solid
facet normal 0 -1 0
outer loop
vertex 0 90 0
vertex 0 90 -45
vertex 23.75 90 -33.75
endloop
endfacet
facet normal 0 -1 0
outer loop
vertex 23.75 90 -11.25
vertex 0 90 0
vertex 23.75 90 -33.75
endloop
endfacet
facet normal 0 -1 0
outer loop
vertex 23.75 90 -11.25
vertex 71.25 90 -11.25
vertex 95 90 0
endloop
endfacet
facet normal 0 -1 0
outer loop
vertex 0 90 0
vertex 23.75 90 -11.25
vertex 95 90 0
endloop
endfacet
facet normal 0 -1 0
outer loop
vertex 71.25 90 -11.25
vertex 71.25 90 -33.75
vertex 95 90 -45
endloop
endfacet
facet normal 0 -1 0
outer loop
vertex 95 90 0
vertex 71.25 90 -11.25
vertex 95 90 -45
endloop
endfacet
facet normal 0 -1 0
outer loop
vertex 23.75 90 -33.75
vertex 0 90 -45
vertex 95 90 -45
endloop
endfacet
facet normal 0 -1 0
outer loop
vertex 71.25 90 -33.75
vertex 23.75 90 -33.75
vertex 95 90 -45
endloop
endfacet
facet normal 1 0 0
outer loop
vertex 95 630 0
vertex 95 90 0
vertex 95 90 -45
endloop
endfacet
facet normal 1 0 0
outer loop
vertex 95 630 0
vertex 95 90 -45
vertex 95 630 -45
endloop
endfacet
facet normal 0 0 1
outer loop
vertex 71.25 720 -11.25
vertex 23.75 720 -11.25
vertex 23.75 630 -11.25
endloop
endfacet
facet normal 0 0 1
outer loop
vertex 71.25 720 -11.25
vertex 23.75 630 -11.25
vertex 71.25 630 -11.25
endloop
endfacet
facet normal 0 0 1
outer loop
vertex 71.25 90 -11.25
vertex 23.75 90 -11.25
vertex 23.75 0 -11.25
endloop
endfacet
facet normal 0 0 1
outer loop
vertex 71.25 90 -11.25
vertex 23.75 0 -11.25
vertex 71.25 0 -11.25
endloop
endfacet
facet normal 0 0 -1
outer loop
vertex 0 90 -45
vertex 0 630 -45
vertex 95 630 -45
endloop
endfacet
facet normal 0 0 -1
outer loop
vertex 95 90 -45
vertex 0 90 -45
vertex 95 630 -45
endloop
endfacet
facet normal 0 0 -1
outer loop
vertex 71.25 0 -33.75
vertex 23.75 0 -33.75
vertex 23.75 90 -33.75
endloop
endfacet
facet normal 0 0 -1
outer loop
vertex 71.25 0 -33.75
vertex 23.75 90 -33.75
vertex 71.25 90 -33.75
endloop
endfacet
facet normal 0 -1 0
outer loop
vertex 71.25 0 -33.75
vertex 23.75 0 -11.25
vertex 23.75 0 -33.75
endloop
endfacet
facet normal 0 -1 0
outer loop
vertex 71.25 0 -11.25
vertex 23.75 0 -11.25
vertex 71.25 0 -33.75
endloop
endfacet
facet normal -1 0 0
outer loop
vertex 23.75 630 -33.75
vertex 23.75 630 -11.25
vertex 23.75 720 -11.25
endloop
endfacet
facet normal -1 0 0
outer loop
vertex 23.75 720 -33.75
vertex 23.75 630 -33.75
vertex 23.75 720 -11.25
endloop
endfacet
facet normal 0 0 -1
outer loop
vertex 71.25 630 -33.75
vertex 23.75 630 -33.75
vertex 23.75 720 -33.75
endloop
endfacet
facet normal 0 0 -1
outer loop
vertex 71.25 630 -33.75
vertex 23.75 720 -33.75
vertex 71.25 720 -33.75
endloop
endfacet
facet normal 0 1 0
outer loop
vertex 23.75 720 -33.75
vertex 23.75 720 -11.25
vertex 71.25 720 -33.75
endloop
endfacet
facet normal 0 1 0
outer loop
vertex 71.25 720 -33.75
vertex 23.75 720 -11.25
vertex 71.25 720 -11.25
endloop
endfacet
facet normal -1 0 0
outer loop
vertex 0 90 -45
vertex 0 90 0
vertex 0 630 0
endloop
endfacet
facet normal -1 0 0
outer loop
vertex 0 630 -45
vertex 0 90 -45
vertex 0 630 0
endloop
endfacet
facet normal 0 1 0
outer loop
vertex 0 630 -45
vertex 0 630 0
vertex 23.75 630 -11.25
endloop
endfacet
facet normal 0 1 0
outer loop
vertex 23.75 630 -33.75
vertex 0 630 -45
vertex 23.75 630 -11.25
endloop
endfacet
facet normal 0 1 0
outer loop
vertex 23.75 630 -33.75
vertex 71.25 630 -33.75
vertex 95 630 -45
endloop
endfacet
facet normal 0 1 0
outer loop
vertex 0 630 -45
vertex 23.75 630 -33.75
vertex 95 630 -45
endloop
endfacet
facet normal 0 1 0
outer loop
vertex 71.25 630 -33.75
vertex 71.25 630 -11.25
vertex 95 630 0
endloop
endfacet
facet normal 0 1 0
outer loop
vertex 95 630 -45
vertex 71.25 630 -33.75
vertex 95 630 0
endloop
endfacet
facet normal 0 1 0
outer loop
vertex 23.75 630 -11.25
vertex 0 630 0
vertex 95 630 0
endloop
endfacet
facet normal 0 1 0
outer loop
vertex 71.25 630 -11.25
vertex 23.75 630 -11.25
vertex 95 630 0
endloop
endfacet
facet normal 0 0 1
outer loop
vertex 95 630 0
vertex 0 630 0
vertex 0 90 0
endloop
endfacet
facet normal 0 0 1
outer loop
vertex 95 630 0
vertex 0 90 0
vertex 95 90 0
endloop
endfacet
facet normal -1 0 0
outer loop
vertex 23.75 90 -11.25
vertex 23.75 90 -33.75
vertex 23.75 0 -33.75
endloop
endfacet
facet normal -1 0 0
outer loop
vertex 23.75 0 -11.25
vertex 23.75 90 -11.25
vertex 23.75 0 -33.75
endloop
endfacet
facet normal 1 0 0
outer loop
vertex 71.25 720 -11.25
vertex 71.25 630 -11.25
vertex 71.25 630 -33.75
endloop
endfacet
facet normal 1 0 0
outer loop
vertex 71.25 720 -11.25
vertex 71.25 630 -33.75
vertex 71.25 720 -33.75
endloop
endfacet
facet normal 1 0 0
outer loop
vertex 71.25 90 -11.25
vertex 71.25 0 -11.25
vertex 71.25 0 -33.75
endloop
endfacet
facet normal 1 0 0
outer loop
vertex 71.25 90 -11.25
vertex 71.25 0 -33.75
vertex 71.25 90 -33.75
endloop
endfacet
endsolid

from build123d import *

# Parameters (mm, degrees)
SKETCH004_W     = 95
SKETCH004_H     = 720
PAD002_DEPTH    = 45
SKETCH014_W     = 95
SKETCH014_H     = 90
POCKET008_DEPTH = 11.25
SKETCH015_W     = 95
SKETCH015_H     = 90
POCKET009_DEPTH = 11.25
SKETCH016_W     = 23.75
SKETCH016_H     = 90
POCKET010_DEPTH = 11.25
SKETCH017_W     = 23.75
SKETCH017_H     = 90
POCKET011_DEPTH = 11.25
SKETCH018_W     = 23.75
SKETCH018_H     = 90
POCKET012_DEPTH = 11.25
SKETCH019_W     = 23.75
SKETCH019_H     = 90
POCKET013_DEPTH = 11.25


with BuildPart() as part:
    # Sketch004 → Pad002 (new body)
    with BuildSketch(Plane.XY):
        with Locations((47.5, 360)):
            Rectangle(SKETCH004_W, SKETCH004_H)
    extrude(amount=-PAD002_DEPTH)

    # Sketch014 (on Face5 of Pad002) → Pocket008 (cut)
    with BuildSketch(Plane.XY):
        with Locations((47.5, 45)):
            Rectangle(SKETCH014_W, SKETCH014_H)
        with Locations((47.5, 675)):
            Rectangle(SKETCH014_W, SKETCH014_H)
    extrude(amount=-POCKET008_DEPTH, mode=Mode.SUBTRACT)

    # Sketch015 (on Face4 of Pocket008) → Pocket009 (cut)
    with BuildSketch(Plane(origin=(0, 0, -45), x_dir=(1, 0, 0), z_dir=(0, 0, -1))):
        with Locations((47.5, -45)):
            Rectangle(SKETCH015_W, SKETCH015_H)
        with Locations((47.5, -675)):
            Rectangle(SKETCH015_W, SKETCH015_H)
    extrude(amount=-POCKET009_DEPTH, mode=Mode.SUBTRACT)

    # Sketch016 (on Face9 of Pocket009) → Pocket010 (cut)
    with BuildSketch(Plane.XY.offset(-11.25)):
        with Locations((11.875, 45)):
            Rectangle(SKETCH016_W, SKETCH016_H)
        with Locations((83.125, 45)):
            Rectangle(SKETCH016_W, SKETCH016_H)
    extrude(amount=-POCKET010_DEPTH, mode=Mode.SUBTRACT)

    # Sketch017 (on Face11 of Pocket010) → Pocket011 (cut)
    with BuildSketch(Plane(origin=(0, 0, -33.75), x_dir=(1, 0, 0), z_dir=(0, 0, -1))):
        with Locations((83.125, -45)):
            Rectangle(SKETCH017_W, SKETCH017_H)
        with Locations((11.875, -45)):
            Rectangle(SKETCH017_W, SKETCH017_H)
    extrude(amount=-POCKET011_DEPTH, mode=Mode.SUBTRACT)

    # Sketch018 (on Face5 of Pocket011) → Pocket012 (cut)
    with BuildSketch(Plane.XY.offset(-11.25)):
        with Locations((83.125, 675)):
            Rectangle(SKETCH018_W, SKETCH018_H)
        with Locations((11.875, 675)):
            Rectangle(SKETCH018_W, SKETCH018_H)
    extrude(amount=-POCKET012_DEPTH, mode=Mode.SUBTRACT)

    # Sketch019 (on Face3 of Pocket012) → Pocket013 (cut)
    with BuildSketch(Plane(origin=(0, 0, -33.75), x_dir=(1, 0, 0), z_dir=(0, 0, -1))):
        with Locations((11.875, -675)):
            Rectangle(SKETCH019_W, SKETCH019_H)
        with Locations((83.125, -675)):
            Rectangle(SKETCH019_W, SKETCH019_H)
    extrude(amount=-POCKET013_DEPTH, mode=Mode.SUBTRACT)


solid = part.part
